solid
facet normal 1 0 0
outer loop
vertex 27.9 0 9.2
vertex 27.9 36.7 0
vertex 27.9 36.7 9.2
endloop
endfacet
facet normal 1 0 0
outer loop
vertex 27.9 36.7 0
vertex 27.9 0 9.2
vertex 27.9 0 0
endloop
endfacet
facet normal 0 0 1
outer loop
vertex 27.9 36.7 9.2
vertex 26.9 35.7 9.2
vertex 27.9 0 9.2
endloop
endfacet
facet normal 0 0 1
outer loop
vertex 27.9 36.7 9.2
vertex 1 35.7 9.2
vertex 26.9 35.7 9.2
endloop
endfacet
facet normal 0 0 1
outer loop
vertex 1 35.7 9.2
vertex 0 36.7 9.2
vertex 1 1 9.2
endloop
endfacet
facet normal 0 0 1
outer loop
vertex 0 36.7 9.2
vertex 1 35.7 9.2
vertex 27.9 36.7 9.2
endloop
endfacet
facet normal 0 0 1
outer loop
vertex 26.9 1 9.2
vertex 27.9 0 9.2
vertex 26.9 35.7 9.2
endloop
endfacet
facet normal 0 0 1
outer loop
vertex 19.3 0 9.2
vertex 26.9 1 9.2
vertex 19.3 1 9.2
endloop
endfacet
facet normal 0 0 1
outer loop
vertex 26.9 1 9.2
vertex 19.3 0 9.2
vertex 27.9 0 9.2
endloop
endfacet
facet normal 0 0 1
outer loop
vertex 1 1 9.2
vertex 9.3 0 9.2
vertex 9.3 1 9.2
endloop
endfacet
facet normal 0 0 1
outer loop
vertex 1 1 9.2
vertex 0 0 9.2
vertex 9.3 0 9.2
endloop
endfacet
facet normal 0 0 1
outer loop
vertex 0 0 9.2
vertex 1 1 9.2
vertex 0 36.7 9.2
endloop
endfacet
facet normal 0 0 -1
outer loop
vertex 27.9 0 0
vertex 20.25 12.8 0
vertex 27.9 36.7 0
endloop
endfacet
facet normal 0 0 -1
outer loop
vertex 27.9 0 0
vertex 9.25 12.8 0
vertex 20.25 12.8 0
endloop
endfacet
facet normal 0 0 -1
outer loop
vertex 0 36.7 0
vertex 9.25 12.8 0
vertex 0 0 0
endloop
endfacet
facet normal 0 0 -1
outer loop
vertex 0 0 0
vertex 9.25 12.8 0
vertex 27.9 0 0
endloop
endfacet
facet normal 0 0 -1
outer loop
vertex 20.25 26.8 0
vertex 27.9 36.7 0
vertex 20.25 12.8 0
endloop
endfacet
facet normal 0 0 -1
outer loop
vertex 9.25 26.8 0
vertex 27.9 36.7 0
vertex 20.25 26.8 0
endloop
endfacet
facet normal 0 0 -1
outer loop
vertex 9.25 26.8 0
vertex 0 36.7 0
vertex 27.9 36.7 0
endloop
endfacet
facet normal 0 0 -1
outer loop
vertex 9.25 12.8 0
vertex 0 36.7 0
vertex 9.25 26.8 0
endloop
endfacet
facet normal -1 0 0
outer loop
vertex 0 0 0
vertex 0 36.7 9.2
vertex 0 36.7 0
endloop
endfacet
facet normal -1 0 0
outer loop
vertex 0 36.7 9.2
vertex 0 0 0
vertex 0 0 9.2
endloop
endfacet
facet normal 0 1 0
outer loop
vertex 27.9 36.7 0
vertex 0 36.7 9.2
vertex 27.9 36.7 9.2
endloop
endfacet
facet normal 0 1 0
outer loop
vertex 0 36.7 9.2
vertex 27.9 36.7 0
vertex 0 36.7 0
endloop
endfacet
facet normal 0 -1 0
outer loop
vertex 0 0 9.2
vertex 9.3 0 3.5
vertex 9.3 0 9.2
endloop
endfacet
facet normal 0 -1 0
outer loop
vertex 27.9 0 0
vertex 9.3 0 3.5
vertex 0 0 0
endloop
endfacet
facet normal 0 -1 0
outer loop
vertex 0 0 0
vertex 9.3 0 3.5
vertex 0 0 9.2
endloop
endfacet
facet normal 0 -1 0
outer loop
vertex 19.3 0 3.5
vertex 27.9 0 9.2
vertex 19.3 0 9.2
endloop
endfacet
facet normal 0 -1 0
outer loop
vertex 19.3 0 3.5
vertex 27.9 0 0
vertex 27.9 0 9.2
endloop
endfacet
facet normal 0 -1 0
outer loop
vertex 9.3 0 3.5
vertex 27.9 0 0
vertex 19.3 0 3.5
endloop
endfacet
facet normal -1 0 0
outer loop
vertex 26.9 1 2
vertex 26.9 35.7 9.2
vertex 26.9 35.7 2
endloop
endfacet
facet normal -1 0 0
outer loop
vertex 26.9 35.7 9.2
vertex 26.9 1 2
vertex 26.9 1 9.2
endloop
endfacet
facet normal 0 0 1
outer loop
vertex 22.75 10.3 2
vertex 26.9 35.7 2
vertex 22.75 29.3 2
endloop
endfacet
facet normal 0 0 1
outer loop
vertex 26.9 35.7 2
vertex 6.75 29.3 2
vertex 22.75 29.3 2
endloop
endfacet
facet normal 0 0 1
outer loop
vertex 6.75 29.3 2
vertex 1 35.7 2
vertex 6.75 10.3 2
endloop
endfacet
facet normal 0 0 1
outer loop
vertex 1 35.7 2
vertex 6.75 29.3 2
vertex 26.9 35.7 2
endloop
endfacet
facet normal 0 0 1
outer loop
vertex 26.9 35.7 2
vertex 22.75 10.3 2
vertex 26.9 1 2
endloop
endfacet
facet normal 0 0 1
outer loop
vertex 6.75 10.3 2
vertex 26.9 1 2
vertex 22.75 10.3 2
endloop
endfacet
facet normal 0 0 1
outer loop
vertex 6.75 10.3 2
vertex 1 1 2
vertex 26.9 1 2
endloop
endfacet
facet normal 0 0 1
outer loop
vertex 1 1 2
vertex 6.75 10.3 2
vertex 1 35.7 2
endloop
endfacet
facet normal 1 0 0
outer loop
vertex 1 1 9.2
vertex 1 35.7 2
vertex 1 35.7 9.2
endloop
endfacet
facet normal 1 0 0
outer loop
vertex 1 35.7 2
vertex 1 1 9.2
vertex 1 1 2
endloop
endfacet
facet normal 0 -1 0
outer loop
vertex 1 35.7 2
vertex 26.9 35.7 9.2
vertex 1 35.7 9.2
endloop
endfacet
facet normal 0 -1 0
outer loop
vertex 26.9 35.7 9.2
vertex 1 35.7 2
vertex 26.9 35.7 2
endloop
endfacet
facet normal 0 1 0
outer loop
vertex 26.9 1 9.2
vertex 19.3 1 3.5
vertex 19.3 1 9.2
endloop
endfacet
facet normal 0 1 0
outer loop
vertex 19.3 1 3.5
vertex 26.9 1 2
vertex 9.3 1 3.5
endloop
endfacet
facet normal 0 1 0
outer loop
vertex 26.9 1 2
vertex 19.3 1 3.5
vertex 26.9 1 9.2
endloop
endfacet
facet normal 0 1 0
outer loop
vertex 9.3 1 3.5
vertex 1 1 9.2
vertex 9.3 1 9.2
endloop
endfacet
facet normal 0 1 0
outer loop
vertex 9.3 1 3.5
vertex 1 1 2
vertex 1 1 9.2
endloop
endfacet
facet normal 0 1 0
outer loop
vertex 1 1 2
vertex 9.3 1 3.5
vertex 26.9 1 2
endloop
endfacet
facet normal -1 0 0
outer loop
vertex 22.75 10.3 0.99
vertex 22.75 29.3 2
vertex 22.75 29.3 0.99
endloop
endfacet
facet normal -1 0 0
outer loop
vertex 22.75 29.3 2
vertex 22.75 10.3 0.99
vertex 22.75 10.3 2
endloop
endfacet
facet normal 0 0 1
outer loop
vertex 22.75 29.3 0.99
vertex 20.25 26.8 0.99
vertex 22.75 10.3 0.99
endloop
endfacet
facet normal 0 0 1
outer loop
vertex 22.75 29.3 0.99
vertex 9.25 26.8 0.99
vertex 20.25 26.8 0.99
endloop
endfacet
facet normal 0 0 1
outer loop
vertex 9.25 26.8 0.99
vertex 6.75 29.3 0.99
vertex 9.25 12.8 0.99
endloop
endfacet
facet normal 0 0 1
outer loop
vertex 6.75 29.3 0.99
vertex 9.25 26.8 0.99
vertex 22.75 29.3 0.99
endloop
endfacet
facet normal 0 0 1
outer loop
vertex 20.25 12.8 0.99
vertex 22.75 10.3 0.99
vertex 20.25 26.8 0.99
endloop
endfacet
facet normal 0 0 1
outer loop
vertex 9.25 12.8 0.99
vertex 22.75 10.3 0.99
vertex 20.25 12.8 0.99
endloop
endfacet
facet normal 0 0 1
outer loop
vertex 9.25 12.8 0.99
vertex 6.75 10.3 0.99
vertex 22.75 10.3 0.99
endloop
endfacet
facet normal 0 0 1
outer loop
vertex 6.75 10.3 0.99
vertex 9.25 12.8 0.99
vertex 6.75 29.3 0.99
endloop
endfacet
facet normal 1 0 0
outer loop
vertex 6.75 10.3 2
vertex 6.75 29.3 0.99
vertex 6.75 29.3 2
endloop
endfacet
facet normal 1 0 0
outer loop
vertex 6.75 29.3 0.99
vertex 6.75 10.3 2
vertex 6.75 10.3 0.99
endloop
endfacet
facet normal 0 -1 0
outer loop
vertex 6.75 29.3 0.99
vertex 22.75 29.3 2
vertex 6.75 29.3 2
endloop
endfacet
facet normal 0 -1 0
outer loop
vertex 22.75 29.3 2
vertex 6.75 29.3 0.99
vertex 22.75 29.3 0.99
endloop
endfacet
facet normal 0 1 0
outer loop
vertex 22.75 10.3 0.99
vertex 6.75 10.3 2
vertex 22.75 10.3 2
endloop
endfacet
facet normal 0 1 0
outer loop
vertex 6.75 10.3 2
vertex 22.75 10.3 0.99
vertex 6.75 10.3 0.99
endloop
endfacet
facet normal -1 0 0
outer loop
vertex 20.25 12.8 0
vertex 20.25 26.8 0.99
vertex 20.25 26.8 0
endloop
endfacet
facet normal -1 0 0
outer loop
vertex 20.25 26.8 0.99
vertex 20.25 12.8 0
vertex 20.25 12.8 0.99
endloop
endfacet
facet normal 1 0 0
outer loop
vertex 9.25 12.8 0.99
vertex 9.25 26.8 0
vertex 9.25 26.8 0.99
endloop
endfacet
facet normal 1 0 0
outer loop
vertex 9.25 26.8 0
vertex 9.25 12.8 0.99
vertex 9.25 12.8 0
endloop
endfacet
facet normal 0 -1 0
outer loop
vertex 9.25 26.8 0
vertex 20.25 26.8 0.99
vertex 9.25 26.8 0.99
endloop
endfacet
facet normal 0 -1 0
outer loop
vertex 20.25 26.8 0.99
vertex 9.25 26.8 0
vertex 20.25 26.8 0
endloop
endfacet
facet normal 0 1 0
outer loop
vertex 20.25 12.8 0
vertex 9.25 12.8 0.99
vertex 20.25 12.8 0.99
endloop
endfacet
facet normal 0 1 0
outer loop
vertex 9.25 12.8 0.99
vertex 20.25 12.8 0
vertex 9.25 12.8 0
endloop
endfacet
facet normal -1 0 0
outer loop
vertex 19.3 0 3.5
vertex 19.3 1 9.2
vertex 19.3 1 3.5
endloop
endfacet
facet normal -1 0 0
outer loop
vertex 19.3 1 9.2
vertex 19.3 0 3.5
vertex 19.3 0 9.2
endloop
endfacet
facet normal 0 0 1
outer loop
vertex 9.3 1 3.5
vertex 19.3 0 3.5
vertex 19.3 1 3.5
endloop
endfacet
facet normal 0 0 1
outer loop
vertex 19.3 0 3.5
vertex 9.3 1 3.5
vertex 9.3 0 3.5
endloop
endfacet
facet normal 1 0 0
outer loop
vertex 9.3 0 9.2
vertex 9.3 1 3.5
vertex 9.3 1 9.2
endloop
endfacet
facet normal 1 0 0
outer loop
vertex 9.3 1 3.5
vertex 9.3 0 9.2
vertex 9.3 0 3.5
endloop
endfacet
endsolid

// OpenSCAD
// file: support/funcs.scad
function calc_diag(w, d) = sqrt(pow(w, 2) + pow(d, 2));;
function dist(point1, point2=[0,0,0]) = sqrt(pow(point2.x - point1.x, 2) + pow(point2.y - point1.y, 2) + pow(point2.z - point1.z, 2));
function has(list, item) = len(search(list, item)) > 0;
// file: support/vars.scad
// Used to merge objects on the same coord
rerr = 0.01;
rerr2 = rerr*2;

// Typically recommended to use nozzle size as tolerance to get two pieces to fit together tightly
tolerances = [
  ["perfect",  0.1],
  ["precise",  0.2],
  ["tight",    0.3],
  ["friction", 0.4],
  ["loose",    0.5],
  ["near",     0.6],
];
function tolerance(key) = tolerances[search([key], tolerances)[0]][1];

wall_sizes = [
  ["paper",    1],
  ["flimsy",   2],
  ["weak",     3],
  ["strong",   4],
  ["stronger", 5],
  ["solid",    6],
];
function wall_size(key) = wall_sizes[search([key], wall_sizes)[0]][1];

// Defaults (Can be overridden)
wall = wall_size("flimsy");
tol = tolerance("loose");
// file: support/helpers.scad
include <vars.scad>
include <funcs.scad>

module rgb(r, g, b, a=1) {
  color([r/255, g/255, b/255, a])
  children();
}

module walls(inner_cube, wall_w=1, sides=["walls", "floor", "ceil"], center=[0, 0, 0]) {
  // TODO: Respect "sides"
  outer_cube = [inner_cube.x+(wall_w*2), inner_cube.y+(wall_w*2), inner_cube.z+(wall_w*2)];
  translate([-(outer_cube.x*center.x), -(outer_cube.y*center.y), -(outer_cube.z*center.z)])
  difference() {
    box(outer_cube);

    translate([wall_w, wall_w, has(sides, "floor") ? wall : -wall_w])
    box([inner_cube.x, inner_cube.y, outer_cube.z+(wall_w*2)]);
  }
}
module outerWalls(outer_cube, wall_w=1, sides=["walls", "floor", "ceil"], center=[0, 0, 0]) {
  walls([outer_cube.x+(wall_w*2), outer_cube.y+(wall_w*2), outer_cube.z+(wall_w*2)], wall_w, sides, center);
}

module box(size=[1, 1, 1], center=[0, 0, 0]) {
  // Should be able to provide a single value for size and/or center to apply to all 3
  translate([-(size.x*center.x), -(size.y*center.y), -(size.z*center.z)]) cube(size);
}

module roundedbox(size=[1, 1, 1], center=[0, 0, 0], radius=1) {
  // Should be able to provide a single value for size and/or center to apply to all 3
  translate([-(size.x*center.x), -(size.y*center.y), -(size.z*center.z)]) roundedcube(size, radius=radius);
}
// main file
include <support/helpers.scad>
include <esp.scad>

drawer_width = 121;

// difference() {
//   walls([drawer_width, 50, 10]);
//   espWallsCutout();
// }

espWalls();
